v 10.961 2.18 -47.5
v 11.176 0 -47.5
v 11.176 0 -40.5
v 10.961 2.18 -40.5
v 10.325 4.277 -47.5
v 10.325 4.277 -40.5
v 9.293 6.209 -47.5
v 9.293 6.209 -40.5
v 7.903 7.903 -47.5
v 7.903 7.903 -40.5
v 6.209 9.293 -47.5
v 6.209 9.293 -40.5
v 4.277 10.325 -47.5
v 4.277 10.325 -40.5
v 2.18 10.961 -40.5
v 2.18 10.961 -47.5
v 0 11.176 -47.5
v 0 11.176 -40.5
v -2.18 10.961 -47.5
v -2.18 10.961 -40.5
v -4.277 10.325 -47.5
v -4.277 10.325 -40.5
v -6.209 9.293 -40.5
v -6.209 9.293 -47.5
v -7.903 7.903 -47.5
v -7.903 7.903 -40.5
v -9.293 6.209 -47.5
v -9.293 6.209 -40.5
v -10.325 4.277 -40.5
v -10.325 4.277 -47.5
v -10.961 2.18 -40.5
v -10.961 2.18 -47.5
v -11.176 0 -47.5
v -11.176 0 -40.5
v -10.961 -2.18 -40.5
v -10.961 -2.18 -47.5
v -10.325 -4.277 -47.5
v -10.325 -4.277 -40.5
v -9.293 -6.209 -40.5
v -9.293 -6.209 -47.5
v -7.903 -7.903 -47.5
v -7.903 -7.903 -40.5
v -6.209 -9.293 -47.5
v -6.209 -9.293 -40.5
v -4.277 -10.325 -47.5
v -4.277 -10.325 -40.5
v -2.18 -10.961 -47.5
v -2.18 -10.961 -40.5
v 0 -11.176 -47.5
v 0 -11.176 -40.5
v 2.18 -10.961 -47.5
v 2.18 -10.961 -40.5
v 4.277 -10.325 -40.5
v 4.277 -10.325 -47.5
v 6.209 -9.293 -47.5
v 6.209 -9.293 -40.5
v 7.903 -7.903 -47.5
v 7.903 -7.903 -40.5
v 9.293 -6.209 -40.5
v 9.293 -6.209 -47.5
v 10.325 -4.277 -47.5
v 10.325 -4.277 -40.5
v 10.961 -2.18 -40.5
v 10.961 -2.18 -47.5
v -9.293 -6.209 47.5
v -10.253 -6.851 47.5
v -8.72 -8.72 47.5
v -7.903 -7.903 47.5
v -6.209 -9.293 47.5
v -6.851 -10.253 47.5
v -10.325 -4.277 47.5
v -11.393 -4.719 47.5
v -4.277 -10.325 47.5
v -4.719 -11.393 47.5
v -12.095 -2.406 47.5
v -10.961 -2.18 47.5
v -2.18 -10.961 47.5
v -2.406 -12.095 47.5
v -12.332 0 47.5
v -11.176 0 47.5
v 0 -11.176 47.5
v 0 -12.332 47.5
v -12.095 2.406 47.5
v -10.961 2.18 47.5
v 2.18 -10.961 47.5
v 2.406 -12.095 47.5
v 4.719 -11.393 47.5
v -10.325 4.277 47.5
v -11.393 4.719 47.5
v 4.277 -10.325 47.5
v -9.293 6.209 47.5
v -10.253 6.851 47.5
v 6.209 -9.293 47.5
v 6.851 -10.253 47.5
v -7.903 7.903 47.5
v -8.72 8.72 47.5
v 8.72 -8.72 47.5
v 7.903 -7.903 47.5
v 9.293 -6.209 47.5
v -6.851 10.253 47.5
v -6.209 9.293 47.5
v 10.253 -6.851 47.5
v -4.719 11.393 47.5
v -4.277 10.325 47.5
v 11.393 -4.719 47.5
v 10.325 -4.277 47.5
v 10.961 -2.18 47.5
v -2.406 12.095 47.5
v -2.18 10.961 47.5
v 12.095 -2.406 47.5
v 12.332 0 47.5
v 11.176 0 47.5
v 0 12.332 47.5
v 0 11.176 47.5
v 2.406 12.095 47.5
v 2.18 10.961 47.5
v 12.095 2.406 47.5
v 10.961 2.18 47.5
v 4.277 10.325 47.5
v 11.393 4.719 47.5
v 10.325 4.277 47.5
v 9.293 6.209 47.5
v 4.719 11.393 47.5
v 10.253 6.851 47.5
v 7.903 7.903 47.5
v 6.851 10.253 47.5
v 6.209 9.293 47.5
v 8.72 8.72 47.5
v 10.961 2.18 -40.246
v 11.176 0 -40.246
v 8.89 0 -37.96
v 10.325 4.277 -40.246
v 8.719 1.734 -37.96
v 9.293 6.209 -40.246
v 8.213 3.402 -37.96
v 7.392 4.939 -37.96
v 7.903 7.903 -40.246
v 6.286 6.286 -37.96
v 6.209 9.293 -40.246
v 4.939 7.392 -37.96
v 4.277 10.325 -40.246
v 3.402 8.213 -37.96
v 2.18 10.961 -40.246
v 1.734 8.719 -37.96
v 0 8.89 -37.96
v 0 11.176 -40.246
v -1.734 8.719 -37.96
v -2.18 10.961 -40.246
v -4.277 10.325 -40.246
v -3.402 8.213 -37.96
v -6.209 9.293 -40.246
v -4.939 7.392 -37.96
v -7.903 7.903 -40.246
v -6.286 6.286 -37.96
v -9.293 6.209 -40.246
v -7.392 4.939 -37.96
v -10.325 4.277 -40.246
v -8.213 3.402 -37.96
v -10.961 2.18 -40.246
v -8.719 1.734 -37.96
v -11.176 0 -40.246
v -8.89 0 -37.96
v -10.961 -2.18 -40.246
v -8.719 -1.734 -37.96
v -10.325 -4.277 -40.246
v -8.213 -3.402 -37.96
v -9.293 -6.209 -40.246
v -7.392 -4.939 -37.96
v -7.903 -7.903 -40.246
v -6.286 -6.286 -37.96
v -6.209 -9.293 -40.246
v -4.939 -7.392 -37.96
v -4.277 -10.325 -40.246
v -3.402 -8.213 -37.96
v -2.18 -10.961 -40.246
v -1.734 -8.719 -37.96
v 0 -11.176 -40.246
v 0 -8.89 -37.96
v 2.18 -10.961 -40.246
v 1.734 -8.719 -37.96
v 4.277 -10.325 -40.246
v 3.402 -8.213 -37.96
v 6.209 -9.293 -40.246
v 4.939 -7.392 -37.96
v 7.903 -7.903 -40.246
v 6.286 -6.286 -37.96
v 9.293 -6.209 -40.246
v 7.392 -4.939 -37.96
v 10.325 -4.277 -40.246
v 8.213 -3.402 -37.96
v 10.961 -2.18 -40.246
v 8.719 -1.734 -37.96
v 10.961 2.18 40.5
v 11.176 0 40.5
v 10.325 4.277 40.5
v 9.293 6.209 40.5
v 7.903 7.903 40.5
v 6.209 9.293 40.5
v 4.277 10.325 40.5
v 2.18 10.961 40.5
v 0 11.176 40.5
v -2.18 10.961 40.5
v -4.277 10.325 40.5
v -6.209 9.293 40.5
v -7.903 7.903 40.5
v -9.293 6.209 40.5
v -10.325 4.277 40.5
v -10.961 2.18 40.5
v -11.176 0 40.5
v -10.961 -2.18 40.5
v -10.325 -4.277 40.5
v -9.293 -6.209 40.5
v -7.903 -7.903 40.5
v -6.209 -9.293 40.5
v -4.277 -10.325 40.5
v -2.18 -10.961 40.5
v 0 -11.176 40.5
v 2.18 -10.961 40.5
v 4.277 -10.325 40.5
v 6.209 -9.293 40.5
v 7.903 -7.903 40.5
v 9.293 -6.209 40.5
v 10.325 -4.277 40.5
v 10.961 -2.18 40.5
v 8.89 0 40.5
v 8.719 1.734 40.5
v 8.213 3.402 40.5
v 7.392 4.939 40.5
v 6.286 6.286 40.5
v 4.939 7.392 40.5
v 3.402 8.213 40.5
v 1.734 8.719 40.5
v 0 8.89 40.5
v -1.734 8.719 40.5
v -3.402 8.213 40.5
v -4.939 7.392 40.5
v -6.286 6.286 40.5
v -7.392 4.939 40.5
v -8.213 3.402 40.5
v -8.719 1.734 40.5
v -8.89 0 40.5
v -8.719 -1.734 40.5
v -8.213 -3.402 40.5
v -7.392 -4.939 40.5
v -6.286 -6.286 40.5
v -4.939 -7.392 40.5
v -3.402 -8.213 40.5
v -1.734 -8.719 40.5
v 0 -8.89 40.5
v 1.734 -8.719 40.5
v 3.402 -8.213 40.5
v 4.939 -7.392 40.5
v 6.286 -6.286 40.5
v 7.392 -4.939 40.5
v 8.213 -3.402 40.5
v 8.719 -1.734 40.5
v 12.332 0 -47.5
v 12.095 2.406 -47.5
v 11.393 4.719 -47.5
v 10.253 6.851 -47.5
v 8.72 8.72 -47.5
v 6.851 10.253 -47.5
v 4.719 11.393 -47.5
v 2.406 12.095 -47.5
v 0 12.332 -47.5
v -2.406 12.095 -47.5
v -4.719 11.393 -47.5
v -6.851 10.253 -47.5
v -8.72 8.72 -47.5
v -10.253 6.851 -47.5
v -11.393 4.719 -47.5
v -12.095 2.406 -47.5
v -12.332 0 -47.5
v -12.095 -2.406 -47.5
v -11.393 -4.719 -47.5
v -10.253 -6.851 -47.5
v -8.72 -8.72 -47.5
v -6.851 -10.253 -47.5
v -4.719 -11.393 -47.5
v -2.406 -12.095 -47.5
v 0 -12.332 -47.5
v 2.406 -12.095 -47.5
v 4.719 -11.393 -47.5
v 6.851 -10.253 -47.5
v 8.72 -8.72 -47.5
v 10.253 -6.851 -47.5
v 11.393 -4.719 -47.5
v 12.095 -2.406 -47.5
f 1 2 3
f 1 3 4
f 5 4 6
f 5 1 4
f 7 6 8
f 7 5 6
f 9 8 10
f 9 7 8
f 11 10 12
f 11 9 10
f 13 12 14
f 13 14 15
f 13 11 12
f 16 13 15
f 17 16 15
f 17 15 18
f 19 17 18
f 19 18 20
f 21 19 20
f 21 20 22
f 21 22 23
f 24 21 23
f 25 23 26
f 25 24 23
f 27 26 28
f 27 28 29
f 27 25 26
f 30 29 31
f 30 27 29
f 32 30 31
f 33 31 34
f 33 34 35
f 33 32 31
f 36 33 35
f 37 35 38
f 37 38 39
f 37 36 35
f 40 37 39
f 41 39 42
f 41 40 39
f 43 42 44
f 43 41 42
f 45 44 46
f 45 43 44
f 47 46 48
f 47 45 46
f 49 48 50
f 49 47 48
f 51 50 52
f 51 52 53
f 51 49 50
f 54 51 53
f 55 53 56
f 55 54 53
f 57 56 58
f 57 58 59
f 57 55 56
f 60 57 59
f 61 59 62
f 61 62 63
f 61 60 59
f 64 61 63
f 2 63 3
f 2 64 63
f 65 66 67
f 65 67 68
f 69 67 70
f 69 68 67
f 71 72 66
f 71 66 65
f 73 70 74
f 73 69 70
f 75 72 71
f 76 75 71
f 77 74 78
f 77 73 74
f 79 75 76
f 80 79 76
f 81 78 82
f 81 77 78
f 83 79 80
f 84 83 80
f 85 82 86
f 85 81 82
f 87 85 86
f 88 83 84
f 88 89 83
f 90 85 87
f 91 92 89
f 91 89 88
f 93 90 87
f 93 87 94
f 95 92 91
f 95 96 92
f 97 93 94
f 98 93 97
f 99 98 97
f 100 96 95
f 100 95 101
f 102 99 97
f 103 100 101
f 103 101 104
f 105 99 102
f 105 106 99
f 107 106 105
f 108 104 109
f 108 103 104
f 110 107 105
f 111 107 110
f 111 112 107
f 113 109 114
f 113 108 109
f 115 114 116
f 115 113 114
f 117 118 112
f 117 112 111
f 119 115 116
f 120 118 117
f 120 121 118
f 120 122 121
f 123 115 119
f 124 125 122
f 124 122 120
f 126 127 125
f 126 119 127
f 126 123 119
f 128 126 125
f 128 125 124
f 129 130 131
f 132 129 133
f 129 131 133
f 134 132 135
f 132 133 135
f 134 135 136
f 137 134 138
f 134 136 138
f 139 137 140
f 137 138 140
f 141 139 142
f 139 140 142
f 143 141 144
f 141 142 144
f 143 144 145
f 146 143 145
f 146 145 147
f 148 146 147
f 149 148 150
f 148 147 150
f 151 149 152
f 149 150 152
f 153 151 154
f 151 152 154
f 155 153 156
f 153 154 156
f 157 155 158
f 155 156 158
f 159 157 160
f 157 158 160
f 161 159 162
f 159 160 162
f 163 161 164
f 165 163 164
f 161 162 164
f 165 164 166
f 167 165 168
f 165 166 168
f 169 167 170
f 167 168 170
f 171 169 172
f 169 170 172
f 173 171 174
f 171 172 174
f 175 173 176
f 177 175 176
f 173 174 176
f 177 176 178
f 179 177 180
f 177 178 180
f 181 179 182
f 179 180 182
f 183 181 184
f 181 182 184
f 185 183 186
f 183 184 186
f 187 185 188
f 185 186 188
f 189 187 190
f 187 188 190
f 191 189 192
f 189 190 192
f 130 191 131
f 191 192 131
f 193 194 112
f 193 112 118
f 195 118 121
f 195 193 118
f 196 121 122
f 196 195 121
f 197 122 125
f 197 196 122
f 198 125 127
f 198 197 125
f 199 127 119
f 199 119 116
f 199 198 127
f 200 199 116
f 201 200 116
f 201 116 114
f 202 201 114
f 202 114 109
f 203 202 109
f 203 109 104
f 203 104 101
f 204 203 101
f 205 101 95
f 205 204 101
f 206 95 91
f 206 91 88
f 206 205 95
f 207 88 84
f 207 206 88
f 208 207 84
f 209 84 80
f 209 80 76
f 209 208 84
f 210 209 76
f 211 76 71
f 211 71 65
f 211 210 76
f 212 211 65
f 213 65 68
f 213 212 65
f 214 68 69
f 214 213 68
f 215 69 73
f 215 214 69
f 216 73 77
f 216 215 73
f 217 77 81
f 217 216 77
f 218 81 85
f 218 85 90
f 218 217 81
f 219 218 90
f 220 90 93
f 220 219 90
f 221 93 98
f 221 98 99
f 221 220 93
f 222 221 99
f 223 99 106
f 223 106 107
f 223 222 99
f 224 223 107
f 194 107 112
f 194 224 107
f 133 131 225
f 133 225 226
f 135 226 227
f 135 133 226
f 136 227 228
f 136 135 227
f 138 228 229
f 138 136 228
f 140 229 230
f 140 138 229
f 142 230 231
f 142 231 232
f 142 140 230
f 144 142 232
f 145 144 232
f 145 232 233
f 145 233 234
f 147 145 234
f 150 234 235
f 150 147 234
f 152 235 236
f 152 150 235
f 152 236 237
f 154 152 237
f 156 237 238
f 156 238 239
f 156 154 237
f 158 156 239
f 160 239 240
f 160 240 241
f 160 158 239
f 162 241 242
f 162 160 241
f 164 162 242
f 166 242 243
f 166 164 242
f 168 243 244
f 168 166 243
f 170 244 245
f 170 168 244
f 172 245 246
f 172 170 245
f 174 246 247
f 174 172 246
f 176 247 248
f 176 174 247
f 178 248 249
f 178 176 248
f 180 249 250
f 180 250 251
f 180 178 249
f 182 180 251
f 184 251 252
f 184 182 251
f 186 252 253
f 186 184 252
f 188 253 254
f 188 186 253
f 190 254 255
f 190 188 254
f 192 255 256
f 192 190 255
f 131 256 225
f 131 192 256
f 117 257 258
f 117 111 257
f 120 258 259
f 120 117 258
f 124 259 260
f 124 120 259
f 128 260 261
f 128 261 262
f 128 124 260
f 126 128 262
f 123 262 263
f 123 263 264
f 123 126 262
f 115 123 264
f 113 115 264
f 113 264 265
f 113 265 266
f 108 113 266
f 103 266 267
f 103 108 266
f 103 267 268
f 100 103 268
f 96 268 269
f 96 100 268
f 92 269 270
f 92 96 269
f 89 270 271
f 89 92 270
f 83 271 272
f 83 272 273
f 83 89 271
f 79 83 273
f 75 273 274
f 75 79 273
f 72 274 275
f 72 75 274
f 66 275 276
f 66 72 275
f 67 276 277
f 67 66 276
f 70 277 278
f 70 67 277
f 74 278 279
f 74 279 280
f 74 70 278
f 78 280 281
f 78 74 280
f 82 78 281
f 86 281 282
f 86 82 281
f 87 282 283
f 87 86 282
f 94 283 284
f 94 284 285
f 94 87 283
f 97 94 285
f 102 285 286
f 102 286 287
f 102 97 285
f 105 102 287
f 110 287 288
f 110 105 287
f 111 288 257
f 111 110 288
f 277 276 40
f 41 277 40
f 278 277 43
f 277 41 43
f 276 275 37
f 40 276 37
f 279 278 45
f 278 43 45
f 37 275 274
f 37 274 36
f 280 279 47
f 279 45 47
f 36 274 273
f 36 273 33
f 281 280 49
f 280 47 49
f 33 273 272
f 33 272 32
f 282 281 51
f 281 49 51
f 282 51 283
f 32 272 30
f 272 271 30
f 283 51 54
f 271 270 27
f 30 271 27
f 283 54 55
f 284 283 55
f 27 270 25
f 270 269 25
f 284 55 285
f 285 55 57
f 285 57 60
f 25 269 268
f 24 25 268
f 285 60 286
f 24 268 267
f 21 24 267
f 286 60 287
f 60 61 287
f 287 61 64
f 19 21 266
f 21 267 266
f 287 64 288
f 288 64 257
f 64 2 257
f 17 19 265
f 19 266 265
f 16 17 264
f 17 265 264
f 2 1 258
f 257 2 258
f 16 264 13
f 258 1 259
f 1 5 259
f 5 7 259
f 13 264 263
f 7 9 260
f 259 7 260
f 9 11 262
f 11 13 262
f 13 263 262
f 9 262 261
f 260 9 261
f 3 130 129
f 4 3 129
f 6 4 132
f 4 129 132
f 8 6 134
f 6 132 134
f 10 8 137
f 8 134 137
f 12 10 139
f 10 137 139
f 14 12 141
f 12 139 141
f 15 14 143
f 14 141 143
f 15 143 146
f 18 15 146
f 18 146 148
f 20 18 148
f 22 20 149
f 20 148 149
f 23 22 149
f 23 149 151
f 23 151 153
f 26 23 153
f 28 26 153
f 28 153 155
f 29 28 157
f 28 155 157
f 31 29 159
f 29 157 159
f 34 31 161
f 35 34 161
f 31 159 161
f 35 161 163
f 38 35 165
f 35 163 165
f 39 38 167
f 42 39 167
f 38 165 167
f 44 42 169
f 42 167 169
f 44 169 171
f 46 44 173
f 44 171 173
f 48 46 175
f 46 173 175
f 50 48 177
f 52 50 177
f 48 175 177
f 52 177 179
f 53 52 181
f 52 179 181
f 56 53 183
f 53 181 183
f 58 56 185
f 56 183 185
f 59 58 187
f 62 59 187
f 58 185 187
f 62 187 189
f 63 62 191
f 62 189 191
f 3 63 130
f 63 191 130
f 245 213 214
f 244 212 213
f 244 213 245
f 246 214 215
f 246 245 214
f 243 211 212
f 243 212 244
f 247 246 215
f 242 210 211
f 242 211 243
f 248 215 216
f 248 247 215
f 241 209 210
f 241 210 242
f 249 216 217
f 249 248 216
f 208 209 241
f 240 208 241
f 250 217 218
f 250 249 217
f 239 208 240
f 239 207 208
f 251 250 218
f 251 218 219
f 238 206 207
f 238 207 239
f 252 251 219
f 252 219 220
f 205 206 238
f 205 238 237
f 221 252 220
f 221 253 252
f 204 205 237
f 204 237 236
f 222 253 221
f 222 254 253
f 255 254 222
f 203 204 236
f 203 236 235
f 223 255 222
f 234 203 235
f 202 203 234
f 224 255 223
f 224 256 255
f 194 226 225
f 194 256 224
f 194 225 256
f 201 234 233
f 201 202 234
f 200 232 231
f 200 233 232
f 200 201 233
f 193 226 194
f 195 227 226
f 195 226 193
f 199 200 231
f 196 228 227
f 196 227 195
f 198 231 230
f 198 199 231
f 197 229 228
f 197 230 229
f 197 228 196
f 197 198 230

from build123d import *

# Parameters (mm, degrees)
F0_R        = 12.3317
F0_R_2      = 11.176
F1_DEPTH    = 47.5
F0_R_3      = 8.89
F2_DEPTH    = 40.5
F3_S5_R     = 11.176
F3_T6_DEPTH = 18


# Not quite as in the source:
# - a fillet or chamfer that OpenCascade refuses, or shapes differently, is made with other operations: its cross-section is extruded or revolved along the edge and cut away or added


with BuildPart() as f1:
    # F0 (on Top) → F1 (new body, symmetric)
    with BuildSketch(Plane.XY):
        Circle(F0_R)
        Circle(F0_R_2, mode=Mode.SUBTRACT)
    extrude(amount=F1_DEPTH, both=True)

    # F0 (on Top) → F2 (join, symmetric)
    with BuildSketch(Plane.XY):
        Circle(F0_R_2)
        Circle(F0_R_3, mode=Mode.SUBTRACT)
    extrude(amount=F2_DEPTH, both=True)

    # F3: chamfer of 2.54 on 1 edges, made by hand


with BuildPart() as f3_tool2:
    # F3_s3 → F3_t4 (revolve)
    with BuildSketch(Plane.XZ):
        Polygon((11.43, -40.5), (8.89, -37.96), (8.89, -40.5), align=None)
    revolve(axis=Axis((0, 0, -40.5), (0, 0, 1)))

    # F3_s5 → F3_t6 (intersect, symmetric)
    with BuildSketch(Plane.XY.offset(-39.2)):
        Circle(F3_S5_R)
    extrude(amount=F3_T6_DEPTH, both=True, mode=Mode.INTERSECT)


with BuildPart() as f1_1:
    add(f1.part)

    # F3_t1: cut F3_tool2
    add(f3_tool2.part, mode=Mode.SUBTRACT)


solid = f1_1.part
